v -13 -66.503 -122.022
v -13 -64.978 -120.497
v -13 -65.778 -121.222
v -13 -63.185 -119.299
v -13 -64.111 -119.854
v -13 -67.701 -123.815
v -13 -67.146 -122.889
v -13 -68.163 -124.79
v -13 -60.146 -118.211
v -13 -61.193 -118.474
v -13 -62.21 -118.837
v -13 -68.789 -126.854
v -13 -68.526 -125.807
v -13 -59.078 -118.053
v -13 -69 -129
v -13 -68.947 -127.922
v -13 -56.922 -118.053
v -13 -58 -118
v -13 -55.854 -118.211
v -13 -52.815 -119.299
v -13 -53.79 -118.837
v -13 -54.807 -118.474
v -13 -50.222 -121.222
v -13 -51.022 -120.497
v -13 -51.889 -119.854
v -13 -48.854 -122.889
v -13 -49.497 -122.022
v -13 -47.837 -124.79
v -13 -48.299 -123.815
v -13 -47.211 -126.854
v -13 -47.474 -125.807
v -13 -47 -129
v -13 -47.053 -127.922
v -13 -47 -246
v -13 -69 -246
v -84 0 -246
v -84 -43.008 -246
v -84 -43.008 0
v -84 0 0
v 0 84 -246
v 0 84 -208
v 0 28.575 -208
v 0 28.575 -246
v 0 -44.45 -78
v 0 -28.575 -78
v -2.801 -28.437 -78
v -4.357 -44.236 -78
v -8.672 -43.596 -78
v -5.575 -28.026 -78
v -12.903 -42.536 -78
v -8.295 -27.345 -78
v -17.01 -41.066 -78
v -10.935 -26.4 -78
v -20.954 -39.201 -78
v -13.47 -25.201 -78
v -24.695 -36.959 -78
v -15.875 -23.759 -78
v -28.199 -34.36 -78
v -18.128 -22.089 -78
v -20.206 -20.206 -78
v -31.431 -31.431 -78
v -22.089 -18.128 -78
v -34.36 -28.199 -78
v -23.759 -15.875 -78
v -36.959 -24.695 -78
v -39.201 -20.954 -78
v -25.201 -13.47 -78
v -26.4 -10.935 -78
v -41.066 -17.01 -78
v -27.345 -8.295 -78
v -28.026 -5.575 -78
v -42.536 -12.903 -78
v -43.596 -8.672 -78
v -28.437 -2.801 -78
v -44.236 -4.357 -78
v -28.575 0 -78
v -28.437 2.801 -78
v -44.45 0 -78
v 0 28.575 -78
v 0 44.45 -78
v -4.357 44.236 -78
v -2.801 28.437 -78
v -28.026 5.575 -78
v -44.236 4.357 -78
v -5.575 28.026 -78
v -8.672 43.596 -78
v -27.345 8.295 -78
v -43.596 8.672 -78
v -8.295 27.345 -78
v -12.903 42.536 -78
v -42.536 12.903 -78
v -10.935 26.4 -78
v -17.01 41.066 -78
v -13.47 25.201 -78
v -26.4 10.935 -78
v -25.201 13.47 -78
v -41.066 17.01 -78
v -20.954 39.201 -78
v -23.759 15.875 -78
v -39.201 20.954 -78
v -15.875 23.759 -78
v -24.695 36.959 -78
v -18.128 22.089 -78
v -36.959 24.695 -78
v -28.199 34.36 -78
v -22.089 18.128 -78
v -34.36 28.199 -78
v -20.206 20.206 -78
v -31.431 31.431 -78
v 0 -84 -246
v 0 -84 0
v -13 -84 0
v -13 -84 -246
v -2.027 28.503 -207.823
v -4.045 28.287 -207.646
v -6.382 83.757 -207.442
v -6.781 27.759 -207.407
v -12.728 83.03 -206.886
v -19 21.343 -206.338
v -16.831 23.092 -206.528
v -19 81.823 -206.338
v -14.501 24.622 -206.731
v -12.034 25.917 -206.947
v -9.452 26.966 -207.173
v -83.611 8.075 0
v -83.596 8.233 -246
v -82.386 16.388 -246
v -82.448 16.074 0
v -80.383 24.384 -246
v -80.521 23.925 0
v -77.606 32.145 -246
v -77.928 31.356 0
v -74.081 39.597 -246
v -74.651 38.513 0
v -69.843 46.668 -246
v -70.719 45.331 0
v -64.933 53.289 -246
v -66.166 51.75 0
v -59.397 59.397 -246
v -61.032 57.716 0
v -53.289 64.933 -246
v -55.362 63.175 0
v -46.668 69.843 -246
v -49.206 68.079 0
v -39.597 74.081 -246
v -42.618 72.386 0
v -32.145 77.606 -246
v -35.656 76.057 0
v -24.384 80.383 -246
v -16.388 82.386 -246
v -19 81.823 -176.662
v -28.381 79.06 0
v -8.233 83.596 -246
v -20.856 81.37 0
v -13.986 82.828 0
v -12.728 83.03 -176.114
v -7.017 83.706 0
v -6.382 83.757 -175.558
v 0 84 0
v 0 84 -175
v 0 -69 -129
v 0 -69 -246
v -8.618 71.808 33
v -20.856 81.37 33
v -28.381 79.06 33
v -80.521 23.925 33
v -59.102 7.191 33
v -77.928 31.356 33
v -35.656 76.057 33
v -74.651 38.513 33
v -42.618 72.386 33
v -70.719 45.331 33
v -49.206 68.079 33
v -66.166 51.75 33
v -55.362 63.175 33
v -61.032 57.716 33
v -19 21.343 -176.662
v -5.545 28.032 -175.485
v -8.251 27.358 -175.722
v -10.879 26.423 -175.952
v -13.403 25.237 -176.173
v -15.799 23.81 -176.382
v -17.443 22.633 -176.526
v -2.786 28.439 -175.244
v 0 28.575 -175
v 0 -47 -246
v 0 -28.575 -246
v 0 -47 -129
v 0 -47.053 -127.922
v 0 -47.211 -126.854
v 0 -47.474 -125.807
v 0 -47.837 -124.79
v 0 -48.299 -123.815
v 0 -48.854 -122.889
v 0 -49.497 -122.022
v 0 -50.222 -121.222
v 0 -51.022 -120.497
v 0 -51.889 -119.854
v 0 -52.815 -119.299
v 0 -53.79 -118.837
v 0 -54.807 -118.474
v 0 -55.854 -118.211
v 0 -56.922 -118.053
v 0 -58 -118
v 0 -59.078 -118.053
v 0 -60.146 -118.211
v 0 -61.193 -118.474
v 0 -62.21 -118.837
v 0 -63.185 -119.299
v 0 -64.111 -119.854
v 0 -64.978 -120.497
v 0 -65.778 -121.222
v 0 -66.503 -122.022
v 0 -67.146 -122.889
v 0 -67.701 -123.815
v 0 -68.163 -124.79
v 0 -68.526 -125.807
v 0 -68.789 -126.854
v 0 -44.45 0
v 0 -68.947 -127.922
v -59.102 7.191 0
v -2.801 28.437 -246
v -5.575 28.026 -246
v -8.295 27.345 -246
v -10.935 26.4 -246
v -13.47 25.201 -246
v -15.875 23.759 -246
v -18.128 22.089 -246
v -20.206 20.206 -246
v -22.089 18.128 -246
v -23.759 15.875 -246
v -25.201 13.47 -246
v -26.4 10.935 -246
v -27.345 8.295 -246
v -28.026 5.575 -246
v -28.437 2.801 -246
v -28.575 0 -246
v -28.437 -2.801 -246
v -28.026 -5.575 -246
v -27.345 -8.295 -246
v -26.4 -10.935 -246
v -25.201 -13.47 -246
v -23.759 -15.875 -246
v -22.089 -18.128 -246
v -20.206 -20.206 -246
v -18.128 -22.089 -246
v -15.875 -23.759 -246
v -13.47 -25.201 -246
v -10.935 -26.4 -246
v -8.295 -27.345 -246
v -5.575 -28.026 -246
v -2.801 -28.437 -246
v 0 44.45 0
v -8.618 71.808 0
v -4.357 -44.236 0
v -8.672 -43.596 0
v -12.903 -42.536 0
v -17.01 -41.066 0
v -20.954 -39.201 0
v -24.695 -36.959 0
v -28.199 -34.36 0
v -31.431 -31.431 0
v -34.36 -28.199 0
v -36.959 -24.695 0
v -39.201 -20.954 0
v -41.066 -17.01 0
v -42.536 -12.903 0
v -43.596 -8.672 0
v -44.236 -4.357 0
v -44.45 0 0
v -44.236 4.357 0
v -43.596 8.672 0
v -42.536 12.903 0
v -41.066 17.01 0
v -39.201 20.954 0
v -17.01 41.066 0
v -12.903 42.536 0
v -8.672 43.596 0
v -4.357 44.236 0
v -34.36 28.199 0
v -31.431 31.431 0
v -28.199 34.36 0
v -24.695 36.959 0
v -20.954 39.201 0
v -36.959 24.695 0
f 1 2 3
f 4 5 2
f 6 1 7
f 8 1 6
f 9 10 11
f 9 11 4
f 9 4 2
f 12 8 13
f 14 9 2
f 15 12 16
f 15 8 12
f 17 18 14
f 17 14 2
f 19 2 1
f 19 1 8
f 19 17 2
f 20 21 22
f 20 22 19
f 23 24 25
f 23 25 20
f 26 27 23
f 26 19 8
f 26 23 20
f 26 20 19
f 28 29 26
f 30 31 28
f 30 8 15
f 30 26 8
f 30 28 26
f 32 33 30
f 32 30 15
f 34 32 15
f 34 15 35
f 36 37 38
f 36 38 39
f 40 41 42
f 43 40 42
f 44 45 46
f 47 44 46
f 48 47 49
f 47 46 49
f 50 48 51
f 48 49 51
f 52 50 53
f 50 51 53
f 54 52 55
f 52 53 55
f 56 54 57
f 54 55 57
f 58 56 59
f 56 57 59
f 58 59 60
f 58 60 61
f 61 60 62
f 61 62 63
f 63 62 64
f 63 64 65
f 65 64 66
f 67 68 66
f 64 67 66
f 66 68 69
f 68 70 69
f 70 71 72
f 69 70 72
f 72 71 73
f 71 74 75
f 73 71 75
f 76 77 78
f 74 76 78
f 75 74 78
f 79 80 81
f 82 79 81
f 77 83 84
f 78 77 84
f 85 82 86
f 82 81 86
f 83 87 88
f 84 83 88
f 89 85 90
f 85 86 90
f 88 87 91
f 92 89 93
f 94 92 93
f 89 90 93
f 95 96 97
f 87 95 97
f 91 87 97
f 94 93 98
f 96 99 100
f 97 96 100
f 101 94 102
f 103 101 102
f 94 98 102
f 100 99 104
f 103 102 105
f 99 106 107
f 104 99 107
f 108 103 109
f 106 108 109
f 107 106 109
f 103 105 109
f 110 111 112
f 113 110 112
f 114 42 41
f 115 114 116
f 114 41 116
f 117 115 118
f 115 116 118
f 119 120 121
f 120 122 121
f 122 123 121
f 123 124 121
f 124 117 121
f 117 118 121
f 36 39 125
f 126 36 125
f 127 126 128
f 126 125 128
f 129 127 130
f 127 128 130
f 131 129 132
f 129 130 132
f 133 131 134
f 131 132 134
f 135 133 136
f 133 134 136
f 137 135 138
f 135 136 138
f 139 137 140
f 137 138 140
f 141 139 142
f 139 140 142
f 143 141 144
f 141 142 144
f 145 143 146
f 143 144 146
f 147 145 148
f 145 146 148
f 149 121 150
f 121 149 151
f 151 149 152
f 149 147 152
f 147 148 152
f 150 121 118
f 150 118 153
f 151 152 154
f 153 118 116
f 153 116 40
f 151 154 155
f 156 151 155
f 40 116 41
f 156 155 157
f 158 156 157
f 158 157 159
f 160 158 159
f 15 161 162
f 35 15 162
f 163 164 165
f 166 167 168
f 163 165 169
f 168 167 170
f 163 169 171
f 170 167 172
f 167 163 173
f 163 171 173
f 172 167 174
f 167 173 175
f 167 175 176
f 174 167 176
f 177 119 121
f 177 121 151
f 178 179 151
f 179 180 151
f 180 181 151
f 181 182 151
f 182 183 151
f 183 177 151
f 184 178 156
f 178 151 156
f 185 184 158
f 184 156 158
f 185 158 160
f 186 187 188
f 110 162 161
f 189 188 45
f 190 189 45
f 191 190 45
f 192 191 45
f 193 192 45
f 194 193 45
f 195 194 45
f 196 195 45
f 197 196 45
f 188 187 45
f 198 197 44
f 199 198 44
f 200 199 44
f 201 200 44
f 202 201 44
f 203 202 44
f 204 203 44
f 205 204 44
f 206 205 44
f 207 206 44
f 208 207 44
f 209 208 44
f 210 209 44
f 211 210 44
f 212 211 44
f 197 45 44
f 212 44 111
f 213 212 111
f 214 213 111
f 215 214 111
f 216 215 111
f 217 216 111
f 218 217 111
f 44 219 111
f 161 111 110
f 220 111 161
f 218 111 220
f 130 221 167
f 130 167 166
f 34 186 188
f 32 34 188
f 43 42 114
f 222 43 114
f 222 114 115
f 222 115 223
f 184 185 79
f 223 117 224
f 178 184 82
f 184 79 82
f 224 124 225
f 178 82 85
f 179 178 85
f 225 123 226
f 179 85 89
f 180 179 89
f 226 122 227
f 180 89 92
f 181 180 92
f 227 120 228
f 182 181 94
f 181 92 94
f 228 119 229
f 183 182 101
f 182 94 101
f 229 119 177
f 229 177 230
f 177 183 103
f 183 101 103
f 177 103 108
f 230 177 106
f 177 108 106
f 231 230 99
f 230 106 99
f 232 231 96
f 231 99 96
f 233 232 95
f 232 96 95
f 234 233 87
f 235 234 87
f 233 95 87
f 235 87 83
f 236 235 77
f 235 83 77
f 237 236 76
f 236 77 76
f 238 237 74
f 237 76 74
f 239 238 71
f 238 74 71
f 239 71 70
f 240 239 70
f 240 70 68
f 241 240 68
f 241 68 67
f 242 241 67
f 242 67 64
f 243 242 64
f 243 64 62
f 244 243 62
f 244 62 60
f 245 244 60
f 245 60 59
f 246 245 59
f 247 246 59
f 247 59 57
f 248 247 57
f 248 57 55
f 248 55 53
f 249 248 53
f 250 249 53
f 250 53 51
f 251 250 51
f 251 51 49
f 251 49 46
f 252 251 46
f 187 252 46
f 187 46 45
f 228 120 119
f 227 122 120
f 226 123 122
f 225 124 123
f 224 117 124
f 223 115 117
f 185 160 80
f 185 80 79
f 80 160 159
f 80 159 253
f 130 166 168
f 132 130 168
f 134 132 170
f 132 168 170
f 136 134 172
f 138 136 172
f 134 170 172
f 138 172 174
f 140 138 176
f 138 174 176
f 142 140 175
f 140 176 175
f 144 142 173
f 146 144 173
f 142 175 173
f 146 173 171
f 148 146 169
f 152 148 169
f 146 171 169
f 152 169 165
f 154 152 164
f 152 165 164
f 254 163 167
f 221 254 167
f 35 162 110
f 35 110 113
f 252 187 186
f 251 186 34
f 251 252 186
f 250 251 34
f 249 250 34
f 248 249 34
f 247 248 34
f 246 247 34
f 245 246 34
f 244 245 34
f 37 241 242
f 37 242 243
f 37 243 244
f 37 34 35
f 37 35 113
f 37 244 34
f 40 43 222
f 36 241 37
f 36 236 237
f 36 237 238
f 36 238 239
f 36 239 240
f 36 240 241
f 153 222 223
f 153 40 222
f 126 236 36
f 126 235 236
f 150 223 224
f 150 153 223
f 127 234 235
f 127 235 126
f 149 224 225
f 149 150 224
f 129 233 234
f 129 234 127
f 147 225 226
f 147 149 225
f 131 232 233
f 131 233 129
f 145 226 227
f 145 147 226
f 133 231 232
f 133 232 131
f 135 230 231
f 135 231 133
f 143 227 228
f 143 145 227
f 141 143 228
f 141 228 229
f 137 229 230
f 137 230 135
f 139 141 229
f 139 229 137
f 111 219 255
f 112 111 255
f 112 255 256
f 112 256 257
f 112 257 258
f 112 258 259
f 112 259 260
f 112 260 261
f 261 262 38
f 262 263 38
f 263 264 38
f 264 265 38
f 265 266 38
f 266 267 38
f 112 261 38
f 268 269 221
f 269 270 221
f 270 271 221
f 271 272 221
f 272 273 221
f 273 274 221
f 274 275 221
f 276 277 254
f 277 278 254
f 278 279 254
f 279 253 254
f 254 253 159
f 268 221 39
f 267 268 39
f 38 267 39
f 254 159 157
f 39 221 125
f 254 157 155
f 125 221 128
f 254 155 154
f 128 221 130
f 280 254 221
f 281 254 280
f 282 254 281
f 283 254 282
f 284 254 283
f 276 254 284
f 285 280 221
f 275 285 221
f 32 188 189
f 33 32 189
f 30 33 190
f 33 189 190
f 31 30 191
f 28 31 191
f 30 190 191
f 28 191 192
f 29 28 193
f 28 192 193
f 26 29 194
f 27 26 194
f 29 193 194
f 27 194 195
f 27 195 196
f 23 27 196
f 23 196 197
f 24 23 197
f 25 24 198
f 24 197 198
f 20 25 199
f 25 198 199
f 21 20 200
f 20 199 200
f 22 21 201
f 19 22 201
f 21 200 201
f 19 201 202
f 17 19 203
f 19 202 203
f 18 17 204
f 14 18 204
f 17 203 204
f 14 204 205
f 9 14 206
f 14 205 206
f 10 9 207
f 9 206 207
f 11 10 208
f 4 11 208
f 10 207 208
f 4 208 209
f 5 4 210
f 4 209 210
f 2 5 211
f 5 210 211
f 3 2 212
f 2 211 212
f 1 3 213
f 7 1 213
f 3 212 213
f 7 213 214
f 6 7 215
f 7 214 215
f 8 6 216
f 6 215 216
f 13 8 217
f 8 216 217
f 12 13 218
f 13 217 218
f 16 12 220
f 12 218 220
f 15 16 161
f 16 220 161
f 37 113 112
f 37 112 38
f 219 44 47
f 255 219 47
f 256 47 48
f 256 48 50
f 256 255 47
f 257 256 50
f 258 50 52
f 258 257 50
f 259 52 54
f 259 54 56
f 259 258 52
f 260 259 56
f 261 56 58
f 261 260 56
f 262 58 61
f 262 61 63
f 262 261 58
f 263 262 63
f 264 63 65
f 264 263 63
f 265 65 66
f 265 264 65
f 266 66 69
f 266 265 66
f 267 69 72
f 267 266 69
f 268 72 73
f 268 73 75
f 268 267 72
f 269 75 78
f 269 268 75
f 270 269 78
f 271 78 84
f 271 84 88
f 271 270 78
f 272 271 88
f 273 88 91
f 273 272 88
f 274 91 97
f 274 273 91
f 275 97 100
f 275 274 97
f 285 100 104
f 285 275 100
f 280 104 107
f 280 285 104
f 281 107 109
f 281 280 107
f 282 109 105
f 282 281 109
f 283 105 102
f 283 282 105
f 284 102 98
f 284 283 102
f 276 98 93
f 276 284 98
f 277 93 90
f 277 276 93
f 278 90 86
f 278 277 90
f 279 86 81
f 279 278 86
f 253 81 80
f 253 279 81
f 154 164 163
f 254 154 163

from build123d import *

# Parameters (mm, degrees)
BOSS_EXTRUDE1_DEPTH     = 246
CUT_EXTRUDE1_DEPTH      = 78
BOSS_EXTRUDE2_START     = 33
BOSS_EXTRUDE2_DEPTH     = 33
CUT_EXTRUDE4_DEPTH      = 13
CUT_EXTRUDE5_REACH      = 314.807
CUT_EXTRUDE5_END_RADIUS = 28.575


with BuildPart() as part:
    # Sketch2 → Boss-Extrude1 (new body)
    with BuildSketch(Plane.XY):
        with BuildLine():
            Line((0, -28.575), (0, -84))
            Line((0, -84), (-13, -84))
            Line((-13, -84), (-84, -43.008130888))
            Line((-84, -43.008130888), (-84, 0))
            ThreePointArc((-84, 0), (-59.39696962, 59.39696962), (0, 84))
            Line((0, 84), (0, 28.575))
            ThreePointArc((0, 28.575), (-28.575, 0), (0, -28.575))
        make_face()
    extrude(amount=-BOSS_EXTRUDE1_DEPTH)

    # Sketch3 → Cut-Extrude1 (cut)
    with BuildSketch(Plane.XY):
        with BuildLine():
            Line((0, 44.45), (0, 28.575))
            ThreePointArc((0, 28.575), (-28.575, 0), (0, -28.575))
            Line((0, -28.575), (0, -44.45))
            ThreePointArc((0, -44.45), (-44.45, 0), (0, 44.45))
        make_face()
    extrude(amount=-CUT_EXTRUDE1_DEPTH, mode=Mode.SUBTRACT)

    # Sketch4 → Boss-Extrude2 (add)
    with BuildSketch(Plane.XY.offset(BOSS_EXTRUDE2_START)):
        with BuildLine():
            Line((-20.856290899, 81.369620436), (-8.61759969, 71.807706907))
            Line((-8.61759969, 71.807706907), (-59.101840666, 7.190825111))
            Line((-59.101840666, 7.190825111), (-80.520739305, 23.925102753))
            ThreePointArc((-80.520739305, 23.925102753), (-58.260567421, 60.512034206), (-20.856290899, 81.369620436))
        make_face()
    extrude(amount=-BOSS_EXTRUDE2_DEPTH)

    # Sketch8 → Cut-Extrude4 (cut)
    with BuildSketch(Plane(origin=(0, 0, 0), x_dir=(0, 0, -1), z_dir=(1, 0, 0))):
        with BuildLine():
            Line((246, -47), (129, -47))
            ThreePointArc((129, -47), (118, -58), (129, -69))
            Line((129, -69), (246, -69))
            Line((246, -69), (246, -47))
        make_face()
    extrude(amount=-CUT_EXTRUDE4_DEPTH, mode=Mode.SUBTRACT)

    # Cut-Extrude5: up to this cylinder (the profile starts outside it)
    cut_extrude5_end = Plane(origin=(0, 0, -191.5), z_dir=(0, 0, 1)) * Cylinder(CUT_EXTRUDE5_END_RADIUS, 687.764, mode=Mode.PRIVATE)
    # Sketch9 → Cut-Extrude5 (cut, up to the surface)
    with BuildSketch(Plane(origin=(0, 90, 0), x_dir=(1, 0, 0), z_dir=(0, 1, 0)), mode=Mode.PRIVATE) as cut_extrude5_sk1:
        Polygon((0, 175), (0, 208), (-19, 206.337715393), (-19, 176.662284607), align=None)
    cut_extrude5_tool1 = extrude(cut_extrude5_sk1.sketch, amount=-CUT_EXTRUDE5_REACH, mode=Mode.PRIVATE) - cut_extrude5_end
    add(cut_extrude5_tool1.solids().sort_by_distance((-9.332027, 90, -191.5))[0], mode=Mode.SUBTRACT)


solid = part.part
